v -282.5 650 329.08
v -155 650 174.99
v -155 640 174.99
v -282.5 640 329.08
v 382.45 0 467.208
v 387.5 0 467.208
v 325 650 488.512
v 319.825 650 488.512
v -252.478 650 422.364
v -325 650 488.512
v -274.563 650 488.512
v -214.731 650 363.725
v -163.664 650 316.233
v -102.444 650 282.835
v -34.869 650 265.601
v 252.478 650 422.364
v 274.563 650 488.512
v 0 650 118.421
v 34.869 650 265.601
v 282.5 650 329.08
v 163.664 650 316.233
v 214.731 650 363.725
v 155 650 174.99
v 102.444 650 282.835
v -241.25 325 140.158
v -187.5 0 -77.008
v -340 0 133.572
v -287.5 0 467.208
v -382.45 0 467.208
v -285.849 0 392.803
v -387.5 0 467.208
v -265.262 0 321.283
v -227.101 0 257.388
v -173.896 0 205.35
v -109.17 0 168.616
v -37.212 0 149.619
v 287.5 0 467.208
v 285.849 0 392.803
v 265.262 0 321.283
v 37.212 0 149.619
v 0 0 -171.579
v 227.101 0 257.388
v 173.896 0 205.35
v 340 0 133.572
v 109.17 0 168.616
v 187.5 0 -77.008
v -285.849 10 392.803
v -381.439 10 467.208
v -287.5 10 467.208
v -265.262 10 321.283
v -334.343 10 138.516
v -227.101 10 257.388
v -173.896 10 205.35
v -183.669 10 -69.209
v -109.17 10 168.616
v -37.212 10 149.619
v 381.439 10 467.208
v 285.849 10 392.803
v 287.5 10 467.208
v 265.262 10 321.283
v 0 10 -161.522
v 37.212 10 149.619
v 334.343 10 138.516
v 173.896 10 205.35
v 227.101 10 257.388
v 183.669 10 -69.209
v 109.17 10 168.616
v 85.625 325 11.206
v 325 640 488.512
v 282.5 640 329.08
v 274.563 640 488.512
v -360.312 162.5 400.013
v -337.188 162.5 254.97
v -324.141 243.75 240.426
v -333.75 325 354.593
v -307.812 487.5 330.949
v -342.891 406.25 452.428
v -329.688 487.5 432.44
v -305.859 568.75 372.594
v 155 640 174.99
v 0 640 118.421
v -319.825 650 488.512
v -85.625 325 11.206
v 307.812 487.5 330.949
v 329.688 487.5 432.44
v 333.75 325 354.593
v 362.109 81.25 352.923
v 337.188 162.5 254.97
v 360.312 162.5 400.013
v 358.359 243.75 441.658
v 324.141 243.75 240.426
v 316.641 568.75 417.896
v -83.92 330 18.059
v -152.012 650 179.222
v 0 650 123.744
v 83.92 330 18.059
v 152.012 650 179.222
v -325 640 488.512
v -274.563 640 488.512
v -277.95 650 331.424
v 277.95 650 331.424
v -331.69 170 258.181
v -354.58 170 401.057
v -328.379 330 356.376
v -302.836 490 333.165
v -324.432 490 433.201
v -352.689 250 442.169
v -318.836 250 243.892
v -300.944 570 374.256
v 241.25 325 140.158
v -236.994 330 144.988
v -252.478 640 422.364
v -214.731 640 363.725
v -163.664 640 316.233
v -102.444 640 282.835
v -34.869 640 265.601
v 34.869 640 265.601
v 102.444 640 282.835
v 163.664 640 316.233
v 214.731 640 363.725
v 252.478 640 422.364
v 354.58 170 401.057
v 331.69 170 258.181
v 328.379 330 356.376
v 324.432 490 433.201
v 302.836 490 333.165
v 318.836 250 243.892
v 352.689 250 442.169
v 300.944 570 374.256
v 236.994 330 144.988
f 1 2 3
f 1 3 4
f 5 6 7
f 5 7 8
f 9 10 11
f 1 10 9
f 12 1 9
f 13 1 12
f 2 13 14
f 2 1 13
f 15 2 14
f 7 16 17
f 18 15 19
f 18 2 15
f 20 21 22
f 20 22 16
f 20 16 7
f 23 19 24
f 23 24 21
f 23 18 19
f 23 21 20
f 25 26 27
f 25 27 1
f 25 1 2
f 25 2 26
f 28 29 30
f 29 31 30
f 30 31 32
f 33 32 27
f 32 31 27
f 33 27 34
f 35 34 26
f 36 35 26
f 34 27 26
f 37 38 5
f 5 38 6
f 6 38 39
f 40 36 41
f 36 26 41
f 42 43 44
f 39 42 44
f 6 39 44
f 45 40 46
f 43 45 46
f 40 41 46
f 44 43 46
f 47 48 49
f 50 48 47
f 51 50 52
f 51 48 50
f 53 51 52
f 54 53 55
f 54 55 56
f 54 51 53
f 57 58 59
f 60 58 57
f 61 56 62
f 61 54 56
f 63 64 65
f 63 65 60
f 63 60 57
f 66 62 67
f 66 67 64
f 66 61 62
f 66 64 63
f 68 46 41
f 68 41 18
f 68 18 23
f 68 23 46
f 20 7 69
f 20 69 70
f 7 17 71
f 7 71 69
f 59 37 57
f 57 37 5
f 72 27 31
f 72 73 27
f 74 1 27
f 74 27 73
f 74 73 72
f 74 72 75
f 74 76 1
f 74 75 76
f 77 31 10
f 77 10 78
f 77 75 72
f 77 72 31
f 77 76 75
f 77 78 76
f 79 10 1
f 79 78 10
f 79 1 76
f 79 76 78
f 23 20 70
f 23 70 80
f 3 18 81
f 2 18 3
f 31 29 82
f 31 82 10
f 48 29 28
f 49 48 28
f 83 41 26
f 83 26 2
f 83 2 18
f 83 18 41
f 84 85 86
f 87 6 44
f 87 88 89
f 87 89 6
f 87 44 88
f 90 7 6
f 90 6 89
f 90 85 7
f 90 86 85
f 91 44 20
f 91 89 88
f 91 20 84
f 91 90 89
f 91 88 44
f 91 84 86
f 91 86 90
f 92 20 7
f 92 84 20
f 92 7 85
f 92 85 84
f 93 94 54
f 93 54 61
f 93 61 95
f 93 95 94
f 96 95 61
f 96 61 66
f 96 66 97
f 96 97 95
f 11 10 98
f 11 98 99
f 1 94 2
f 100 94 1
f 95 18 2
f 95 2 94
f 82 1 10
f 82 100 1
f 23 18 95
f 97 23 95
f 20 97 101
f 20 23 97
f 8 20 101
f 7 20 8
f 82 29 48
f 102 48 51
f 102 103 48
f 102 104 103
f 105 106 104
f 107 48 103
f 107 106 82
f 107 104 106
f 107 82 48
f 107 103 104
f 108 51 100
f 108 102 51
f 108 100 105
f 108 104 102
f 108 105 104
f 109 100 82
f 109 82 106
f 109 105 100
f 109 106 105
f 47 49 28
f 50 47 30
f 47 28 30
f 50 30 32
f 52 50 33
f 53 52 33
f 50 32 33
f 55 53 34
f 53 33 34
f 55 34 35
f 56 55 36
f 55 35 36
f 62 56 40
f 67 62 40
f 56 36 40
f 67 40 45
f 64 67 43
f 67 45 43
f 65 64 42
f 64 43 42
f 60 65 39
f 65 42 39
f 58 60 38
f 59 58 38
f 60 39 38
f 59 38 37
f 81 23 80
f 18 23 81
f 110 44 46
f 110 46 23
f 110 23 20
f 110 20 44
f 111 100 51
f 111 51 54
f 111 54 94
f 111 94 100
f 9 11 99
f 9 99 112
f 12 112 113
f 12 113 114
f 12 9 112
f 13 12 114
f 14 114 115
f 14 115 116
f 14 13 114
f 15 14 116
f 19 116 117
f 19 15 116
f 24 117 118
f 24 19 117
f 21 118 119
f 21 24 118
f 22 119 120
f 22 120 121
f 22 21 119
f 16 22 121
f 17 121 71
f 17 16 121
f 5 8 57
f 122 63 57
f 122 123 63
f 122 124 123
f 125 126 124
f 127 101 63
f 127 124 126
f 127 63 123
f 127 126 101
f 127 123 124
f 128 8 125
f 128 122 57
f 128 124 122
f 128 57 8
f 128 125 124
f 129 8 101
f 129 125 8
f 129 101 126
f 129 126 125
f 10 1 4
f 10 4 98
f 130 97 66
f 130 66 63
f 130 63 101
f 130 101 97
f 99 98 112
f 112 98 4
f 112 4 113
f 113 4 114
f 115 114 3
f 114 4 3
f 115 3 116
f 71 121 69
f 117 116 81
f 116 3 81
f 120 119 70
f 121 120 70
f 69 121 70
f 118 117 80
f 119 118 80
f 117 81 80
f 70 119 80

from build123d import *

# Parameters (mm, degrees)
BOSS_EXTRUDE1_DEPTH = 10
BOSS_EXTRUDE2_DEPTH = 10


with BuildPart() as part:
    # Loft2: read off the stored shape, not the designer's step
    # Loft2: loft between two sections, ruled curve by curve
    loft2_from = [
        Edge.make_bspline([(-335.224381982, 0, 135.502179225), (-310.047520364, 0, 100.736721017), (-284.870658745, 0, 65.97126281), (-234.516935508, 0, -3.559653606), (-209.34007389, 0, -38.325111813), (-184.163212271, 0, -73.090570021)], [0, 0, 0, 0, 0.5, 0.5, 1, 1, 1, 1], 3),
        Edge.make_bspline([(-184.163212271, 0, -73.090570021), (-153.469343559, 0, -88.571968338), (-122.775474847, 0, -104.053366656), (-61.387737424, 0, -135.01616329), (-30.693868712, 0, -150.497561608), (0, 0, -165.978959925)], [0, 0, 0, 0, 0.5, 0.5, 1, 1, 1, 1], 3),
        Edge.make_bspline([(-382.449580547, 0, 467.207653654), (-374.57871412, 0, 411.923407915), (-366.707847692, 0, 356.639162177), (-350.966114837, 0, 246.070670701), (-343.09524841, 0, 190.786424963), (-335.224381982, 0, 135.502179225)], [0, 0, 0, 0, 0.5, 0.5, 1, 1, 1, 1], 3),
        Edge.make_bspline([(0, 0, -165.978959925), (30.693868712, 0, -150.497561608), (61.387737424, 0, -135.01616329), (122.775474847, 0, -104.053366656), (153.469343559, 0, -88.571968338), (184.163212271, 0, -73.090570021)], [0, 0, 0, 0, 0.5, 0.5, 1, 1, 1, 1], 3),
        Edge.make_bspline([(184.163212271, 0, -73.090570021), (209.34007389, 0, -38.325111813), (234.516935508, 0, -3.559653606), (284.870658745, 0, 65.97126281), (310.047520364, 0, 100.736721017), (335.224381982, 0, 135.502179225)], [0, 0, 0, 0, 0.5, 0.5, 1, 1, 1, 1], 3),
        Edge.make_bspline([(335.224381982, 0, 135.502179225), (343.09524841, 0, 190.786424963), (350.966114837, 0, 246.070670701), (366.707847692, 0, 356.639162177), (374.57871412, 0, 411.923407915), (382.449580547, 0, 467.207653654)], [0, 0, 0, 0, 0.5, 0.5, 1, 1, 1, 1], 3),
        Edge.make_bspline([(387.5, 0, 467.207653654), (379.583333333, 0, 411.601711225), (371.666666667, 0, 355.995768797), (355.833333333, 0, 244.783883941), (347.916666667, 0, 189.177941512), (340, 0, 133.571999084)], [0, 0, 0, 0, 0.5, 0.5, 1, 1, 1, 1], 3),
        Edge.make_bspline([(340, 0, 133.571999084), (314.583333333, 0, 98.475406182), (289.166666667, 0, 63.37881328), (238.333333333, 0, -6.814372524), (212.916666667, 0, -41.910965426), (187.5, 0, -77.007558328)], [0, 0, 0, 0, 0.5, 0.5, 1, 1, 1, 1], 3),
        Edge.make_bspline([(187.5, 0, -77.007558328), (156.25, 0, -92.769458594), (125, 0, -108.531358861), (62.5, 0, -140.055159393), (31.25, 0, -155.817059659), (0, 0, -171.578959925)], [0, 0, 0, 0, 0.5, 0.5, 1, 1, 1, 1], 3),
        Edge.make_bspline([(0, 0, -171.578959925), (-31.25, 0, -155.817059659), (-62.5, 0, -140.055159393), (-125, 0, -108.531358861), (-156.25, 0, -92.769458594), (-187.5, 0, -77.007558328)], [0, 0, 0, 0, 0.5, 0.5, 1, 1, 1, 1], 3),
        Edge.make_bspline([(-187.5, 0, -77.007558328), (-212.916666667, 0, -41.910965426), (-238.333333333, 0, -6.814372524), (-289.166666667, 0, 63.37881328), (-314.583333333, 0, 98.475406182), (-340, 0, 133.571999084)], [0, 0, 0, 0, 0.5, 0.5, 1, 1, 1, 1], 3),
        Edge.make_bspline([(-340, 0, 133.571999084), (-347.916666667, 0, 189.177941512), (-355.833333333, 0, 244.783883941), (-371.666666667, 0, 355.995768797), (-379.583333333, 0, 411.601711225), (-387.5, 0, 467.207653654)], [0, 0, 0, 0, 0.5, 0.5, 1, 1, 1, 1], 3),
        Edge.make_line((387.5, 0, 467.207653654), (382.449580547, 0, 467.207653654)),
        Edge.make_line((-382.449580547, 0, 467.207653654), (-387.5, 0, 467.207653654)),
    ]
    loft2_to = [
        Edge.make_bspline([(-277.950447238, 650, 331.424430821), (-256.960724605, 650, 306.057310412), (-235.971001972, 650, 280.690190004), (-193.991556706, 650, 229.955949187), (-173.001834073, 650, 204.588828778), (-152.012111441, 650, 179.22170837)], [0, 0, 0, 0, 0.5, 0.5, 1, 1, 1, 1], 3),
        Edge.make_bspline([(-152.012111441, 650, 179.22170837), (-126.676759534, 650, 169.975360428), (-101.341407627, 650, 160.729012487), (-50.670703814, 650, 142.236316603), (-25.335351907, 650, 132.989968662), (0, 650, 123.74362072)], [0, 0, 0, 0, 0.5, 0.5, 1, 1, 1, 1], 3),
        Edge.make_bspline([(-319.825399172, 650, 488.512241267), (-312.846240516, 650, 462.330939526), (-305.86708186, 650, 436.149637785), (-291.908764549, 650, 383.787034303), (-284.929605893, 650, 357.605732562), (-277.950447238, 650, 331.424430821)], [0, 0, 0, 0, 0.5, 0.5, 1, 1, 1, 1], 3),
        Edge.make_bspline([(0, 650, 123.74362072), (25.335351907, 650, 132.989968662), (50.670703814, 650, 142.236316603), (101.341407627, 650, 160.729012487), (126.676759534, 650, 169.975360428), (152.012111441, 650, 179.22170837)], [0, 0, 0, 0, 0.5, 0.5, 1, 1, 1, 1], 3),
        Edge.make_bspline([(152.012111441, 650, 179.22170837), (173.001834073, 650, 204.588828778), (193.991556706, 650, 229.955949187), (235.971001972, 650, 280.690190004), (256.960724605, 650, 306.057310412), (277.950447238, 650, 331.424430821)], [0, 0, 0, 0, 0.5, 0.5, 1, 1, 1, 1], 3),
        Edge.make_bspline([(277.950447238, 650, 331.424430821), (284.929605893, 650, 357.605732562), (291.908764549, 650, 383.787034303), (305.86708186, 650, 436.149637785), (312.846240516, 650, 462.330939526), (319.825399172, 650, 488.512241267)], [0, 0, 0, 0, 0.5, 0.5, 1, 1, 1, 1], 3),
        Edge.make_bspline([(325, 650, 488.512241267), (317.916666667, 650, 461.940143328), (310.833333333, 650, 435.368045389), (296.666666667, 650, 382.22384951), (289.583333333, 650, 355.651751571), (282.5, 650, 329.079653632)], [0, 0, 0, 0, 0.5, 0.5, 1, 1, 1, 1], 3),
        Edge.make_bspline([(282.5, 650, 329.079653632), (261.25, 650, 303.397975122), (240, 650, 277.716296611), (197.5, 650, 226.35293959), (176.25, 650, 200.67126108), (155, 650, 174.98958257)], [0, 0, 0, 0, 0.5, 0.5, 1, 1, 1, 1], 3),
        Edge.make_bspline([(155, 650, 174.98958257), (129.166666667, 650, 165.561492154), (103.333333333, 650, 156.133401738), (51.666666667, 650, 137.277220906), (25.833333333, 650, 127.849130491), (0, 650, 118.421040075)], [0, 0, 0, 0, 0.5, 0.5, 1, 1, 1, 1], 3),
        Edge.make_bspline([(0, 650, 118.421040075), (-25.833333333, 650, 127.849130491), (-51.666666667, 650, 137.277220906), (-103.333333333, 650, 156.133401738), (-129.166666667, 650, 165.561492154), (-155, 650, 174.98958257)], [0, 0, 0, 0, 0.5, 0.5, 1, 1, 1, 1], 3),
        Edge.make_bspline([(-155, 650, 174.98958257), (-176.25, 650, 200.67126108), (-197.5, 650, 226.35293959), (-240, 650, 277.716296611), (-261.25, 650, 303.397975122), (-282.5, 650, 329.079653632)], [0, 0, 0, 0, 0.5, 0.5, 1, 1, 1, 1], 3),
        Edge.make_bspline([(-282.5, 650, 329.079653632), (-289.583333333, 650, 355.651751571), (-296.666666667, 650, 382.22384951), (-310.833333333, 650, 435.368045389), (-317.916666667, 650, 461.940143328), (-325, 650, 488.512241267)], [0, 0, 0, 0, 0.5, 0.5, 1, 1, 1, 1], 3),
        Edge.make_line((325, 650, 488.512241267), (319.825399172, 650, 488.512241267)),
        Edge.make_line((-319.825399172, 650, 488.512241267), (-325, 650, 488.512241267)),
    ]
    loft2 = Solid(Shell([*[Face.make_surface_from_curves(loft2_from[k], loft2_to[k]) for k in range(14)], Face(Wire(loft2_from)), Face(Wire(loft2_to))]))
    add(loft2)

    # Sketch1<271> → Boss-Extrude1 (add)
    with BuildSketch(Plane(origin=(0, 0, 0), x_dir=(1, 0, 0), z_dir=(0, 1, 0))):
        with BuildLine():
            Line((-381.737726173, -462.207653654), (-382.449580547, -467.207653654))
            Line((-382.449580547, -467.207653654), (-287.5, -467.207653654))
            ThreePointArc((-287.5, -467.207653654), (0, -147.214818982), (287.5, -467.207653654))
            Line((287.5, -467.207653654), (382.449580547, -467.207653654))
            Line((382.449580547, -467.207653654), (381.737726173, -462.207653654))
            Line((381.737726173, -462.207653654), (335.224381982, -135.502179225))
            Line((335.224381982, -135.502179225), (184.163212271, 73.090570021))
            Line((184.163212271, 73.090570021), (0, 165.978959925))
            Line((0, 165.978959925), (-184.163212271, 73.090570021))
            Line((-184.163212271, 73.090570021), (-335.224381982, -135.502179225))
            Line((-335.224381982, -135.502179225), (-381.737726173, -462.207653654))
        make_face()
    extrude(amount=BOSS_EXTRUDE1_DEPTH)


with BuildPart() as body_2:
    # Sketch2<164> → Boss-Extrude2 (new body)
    with BuildSketch(Plane(origin=(0, 650, 0), x_dir=(1, 0, 0), z_dir=(0, 1, 0))):
        with BuildLine():
            Line((0, -118.421040075), (-155, -174.98958257))
            Line((-155, -174.98958257), (-282.5, -329.079653632))
            Line((-282.5, -329.079653632), (-325, -488.512241267))
            Line((-325, -488.512241267), (-274.563332973, -488.512241267))
            ThreePointArc((-274.563332973, -488.512241267), (0, -263.421040075), (274.563332973, -488.512241267))
            Line((274.563332973, -488.512241267), (325, -488.512241267))
            Line((325, -488.512241267), (282.5, -329.079653632))
            Line((282.5, -329.079653632), (155, -174.98958257))
            Line((155, -174.98958257), (0, -118.421040075))
        make_face()
    extrude(amount=-BOSS_EXTRUDE2_DEPTH)


solid = Compound([part.part, body_2.part])
